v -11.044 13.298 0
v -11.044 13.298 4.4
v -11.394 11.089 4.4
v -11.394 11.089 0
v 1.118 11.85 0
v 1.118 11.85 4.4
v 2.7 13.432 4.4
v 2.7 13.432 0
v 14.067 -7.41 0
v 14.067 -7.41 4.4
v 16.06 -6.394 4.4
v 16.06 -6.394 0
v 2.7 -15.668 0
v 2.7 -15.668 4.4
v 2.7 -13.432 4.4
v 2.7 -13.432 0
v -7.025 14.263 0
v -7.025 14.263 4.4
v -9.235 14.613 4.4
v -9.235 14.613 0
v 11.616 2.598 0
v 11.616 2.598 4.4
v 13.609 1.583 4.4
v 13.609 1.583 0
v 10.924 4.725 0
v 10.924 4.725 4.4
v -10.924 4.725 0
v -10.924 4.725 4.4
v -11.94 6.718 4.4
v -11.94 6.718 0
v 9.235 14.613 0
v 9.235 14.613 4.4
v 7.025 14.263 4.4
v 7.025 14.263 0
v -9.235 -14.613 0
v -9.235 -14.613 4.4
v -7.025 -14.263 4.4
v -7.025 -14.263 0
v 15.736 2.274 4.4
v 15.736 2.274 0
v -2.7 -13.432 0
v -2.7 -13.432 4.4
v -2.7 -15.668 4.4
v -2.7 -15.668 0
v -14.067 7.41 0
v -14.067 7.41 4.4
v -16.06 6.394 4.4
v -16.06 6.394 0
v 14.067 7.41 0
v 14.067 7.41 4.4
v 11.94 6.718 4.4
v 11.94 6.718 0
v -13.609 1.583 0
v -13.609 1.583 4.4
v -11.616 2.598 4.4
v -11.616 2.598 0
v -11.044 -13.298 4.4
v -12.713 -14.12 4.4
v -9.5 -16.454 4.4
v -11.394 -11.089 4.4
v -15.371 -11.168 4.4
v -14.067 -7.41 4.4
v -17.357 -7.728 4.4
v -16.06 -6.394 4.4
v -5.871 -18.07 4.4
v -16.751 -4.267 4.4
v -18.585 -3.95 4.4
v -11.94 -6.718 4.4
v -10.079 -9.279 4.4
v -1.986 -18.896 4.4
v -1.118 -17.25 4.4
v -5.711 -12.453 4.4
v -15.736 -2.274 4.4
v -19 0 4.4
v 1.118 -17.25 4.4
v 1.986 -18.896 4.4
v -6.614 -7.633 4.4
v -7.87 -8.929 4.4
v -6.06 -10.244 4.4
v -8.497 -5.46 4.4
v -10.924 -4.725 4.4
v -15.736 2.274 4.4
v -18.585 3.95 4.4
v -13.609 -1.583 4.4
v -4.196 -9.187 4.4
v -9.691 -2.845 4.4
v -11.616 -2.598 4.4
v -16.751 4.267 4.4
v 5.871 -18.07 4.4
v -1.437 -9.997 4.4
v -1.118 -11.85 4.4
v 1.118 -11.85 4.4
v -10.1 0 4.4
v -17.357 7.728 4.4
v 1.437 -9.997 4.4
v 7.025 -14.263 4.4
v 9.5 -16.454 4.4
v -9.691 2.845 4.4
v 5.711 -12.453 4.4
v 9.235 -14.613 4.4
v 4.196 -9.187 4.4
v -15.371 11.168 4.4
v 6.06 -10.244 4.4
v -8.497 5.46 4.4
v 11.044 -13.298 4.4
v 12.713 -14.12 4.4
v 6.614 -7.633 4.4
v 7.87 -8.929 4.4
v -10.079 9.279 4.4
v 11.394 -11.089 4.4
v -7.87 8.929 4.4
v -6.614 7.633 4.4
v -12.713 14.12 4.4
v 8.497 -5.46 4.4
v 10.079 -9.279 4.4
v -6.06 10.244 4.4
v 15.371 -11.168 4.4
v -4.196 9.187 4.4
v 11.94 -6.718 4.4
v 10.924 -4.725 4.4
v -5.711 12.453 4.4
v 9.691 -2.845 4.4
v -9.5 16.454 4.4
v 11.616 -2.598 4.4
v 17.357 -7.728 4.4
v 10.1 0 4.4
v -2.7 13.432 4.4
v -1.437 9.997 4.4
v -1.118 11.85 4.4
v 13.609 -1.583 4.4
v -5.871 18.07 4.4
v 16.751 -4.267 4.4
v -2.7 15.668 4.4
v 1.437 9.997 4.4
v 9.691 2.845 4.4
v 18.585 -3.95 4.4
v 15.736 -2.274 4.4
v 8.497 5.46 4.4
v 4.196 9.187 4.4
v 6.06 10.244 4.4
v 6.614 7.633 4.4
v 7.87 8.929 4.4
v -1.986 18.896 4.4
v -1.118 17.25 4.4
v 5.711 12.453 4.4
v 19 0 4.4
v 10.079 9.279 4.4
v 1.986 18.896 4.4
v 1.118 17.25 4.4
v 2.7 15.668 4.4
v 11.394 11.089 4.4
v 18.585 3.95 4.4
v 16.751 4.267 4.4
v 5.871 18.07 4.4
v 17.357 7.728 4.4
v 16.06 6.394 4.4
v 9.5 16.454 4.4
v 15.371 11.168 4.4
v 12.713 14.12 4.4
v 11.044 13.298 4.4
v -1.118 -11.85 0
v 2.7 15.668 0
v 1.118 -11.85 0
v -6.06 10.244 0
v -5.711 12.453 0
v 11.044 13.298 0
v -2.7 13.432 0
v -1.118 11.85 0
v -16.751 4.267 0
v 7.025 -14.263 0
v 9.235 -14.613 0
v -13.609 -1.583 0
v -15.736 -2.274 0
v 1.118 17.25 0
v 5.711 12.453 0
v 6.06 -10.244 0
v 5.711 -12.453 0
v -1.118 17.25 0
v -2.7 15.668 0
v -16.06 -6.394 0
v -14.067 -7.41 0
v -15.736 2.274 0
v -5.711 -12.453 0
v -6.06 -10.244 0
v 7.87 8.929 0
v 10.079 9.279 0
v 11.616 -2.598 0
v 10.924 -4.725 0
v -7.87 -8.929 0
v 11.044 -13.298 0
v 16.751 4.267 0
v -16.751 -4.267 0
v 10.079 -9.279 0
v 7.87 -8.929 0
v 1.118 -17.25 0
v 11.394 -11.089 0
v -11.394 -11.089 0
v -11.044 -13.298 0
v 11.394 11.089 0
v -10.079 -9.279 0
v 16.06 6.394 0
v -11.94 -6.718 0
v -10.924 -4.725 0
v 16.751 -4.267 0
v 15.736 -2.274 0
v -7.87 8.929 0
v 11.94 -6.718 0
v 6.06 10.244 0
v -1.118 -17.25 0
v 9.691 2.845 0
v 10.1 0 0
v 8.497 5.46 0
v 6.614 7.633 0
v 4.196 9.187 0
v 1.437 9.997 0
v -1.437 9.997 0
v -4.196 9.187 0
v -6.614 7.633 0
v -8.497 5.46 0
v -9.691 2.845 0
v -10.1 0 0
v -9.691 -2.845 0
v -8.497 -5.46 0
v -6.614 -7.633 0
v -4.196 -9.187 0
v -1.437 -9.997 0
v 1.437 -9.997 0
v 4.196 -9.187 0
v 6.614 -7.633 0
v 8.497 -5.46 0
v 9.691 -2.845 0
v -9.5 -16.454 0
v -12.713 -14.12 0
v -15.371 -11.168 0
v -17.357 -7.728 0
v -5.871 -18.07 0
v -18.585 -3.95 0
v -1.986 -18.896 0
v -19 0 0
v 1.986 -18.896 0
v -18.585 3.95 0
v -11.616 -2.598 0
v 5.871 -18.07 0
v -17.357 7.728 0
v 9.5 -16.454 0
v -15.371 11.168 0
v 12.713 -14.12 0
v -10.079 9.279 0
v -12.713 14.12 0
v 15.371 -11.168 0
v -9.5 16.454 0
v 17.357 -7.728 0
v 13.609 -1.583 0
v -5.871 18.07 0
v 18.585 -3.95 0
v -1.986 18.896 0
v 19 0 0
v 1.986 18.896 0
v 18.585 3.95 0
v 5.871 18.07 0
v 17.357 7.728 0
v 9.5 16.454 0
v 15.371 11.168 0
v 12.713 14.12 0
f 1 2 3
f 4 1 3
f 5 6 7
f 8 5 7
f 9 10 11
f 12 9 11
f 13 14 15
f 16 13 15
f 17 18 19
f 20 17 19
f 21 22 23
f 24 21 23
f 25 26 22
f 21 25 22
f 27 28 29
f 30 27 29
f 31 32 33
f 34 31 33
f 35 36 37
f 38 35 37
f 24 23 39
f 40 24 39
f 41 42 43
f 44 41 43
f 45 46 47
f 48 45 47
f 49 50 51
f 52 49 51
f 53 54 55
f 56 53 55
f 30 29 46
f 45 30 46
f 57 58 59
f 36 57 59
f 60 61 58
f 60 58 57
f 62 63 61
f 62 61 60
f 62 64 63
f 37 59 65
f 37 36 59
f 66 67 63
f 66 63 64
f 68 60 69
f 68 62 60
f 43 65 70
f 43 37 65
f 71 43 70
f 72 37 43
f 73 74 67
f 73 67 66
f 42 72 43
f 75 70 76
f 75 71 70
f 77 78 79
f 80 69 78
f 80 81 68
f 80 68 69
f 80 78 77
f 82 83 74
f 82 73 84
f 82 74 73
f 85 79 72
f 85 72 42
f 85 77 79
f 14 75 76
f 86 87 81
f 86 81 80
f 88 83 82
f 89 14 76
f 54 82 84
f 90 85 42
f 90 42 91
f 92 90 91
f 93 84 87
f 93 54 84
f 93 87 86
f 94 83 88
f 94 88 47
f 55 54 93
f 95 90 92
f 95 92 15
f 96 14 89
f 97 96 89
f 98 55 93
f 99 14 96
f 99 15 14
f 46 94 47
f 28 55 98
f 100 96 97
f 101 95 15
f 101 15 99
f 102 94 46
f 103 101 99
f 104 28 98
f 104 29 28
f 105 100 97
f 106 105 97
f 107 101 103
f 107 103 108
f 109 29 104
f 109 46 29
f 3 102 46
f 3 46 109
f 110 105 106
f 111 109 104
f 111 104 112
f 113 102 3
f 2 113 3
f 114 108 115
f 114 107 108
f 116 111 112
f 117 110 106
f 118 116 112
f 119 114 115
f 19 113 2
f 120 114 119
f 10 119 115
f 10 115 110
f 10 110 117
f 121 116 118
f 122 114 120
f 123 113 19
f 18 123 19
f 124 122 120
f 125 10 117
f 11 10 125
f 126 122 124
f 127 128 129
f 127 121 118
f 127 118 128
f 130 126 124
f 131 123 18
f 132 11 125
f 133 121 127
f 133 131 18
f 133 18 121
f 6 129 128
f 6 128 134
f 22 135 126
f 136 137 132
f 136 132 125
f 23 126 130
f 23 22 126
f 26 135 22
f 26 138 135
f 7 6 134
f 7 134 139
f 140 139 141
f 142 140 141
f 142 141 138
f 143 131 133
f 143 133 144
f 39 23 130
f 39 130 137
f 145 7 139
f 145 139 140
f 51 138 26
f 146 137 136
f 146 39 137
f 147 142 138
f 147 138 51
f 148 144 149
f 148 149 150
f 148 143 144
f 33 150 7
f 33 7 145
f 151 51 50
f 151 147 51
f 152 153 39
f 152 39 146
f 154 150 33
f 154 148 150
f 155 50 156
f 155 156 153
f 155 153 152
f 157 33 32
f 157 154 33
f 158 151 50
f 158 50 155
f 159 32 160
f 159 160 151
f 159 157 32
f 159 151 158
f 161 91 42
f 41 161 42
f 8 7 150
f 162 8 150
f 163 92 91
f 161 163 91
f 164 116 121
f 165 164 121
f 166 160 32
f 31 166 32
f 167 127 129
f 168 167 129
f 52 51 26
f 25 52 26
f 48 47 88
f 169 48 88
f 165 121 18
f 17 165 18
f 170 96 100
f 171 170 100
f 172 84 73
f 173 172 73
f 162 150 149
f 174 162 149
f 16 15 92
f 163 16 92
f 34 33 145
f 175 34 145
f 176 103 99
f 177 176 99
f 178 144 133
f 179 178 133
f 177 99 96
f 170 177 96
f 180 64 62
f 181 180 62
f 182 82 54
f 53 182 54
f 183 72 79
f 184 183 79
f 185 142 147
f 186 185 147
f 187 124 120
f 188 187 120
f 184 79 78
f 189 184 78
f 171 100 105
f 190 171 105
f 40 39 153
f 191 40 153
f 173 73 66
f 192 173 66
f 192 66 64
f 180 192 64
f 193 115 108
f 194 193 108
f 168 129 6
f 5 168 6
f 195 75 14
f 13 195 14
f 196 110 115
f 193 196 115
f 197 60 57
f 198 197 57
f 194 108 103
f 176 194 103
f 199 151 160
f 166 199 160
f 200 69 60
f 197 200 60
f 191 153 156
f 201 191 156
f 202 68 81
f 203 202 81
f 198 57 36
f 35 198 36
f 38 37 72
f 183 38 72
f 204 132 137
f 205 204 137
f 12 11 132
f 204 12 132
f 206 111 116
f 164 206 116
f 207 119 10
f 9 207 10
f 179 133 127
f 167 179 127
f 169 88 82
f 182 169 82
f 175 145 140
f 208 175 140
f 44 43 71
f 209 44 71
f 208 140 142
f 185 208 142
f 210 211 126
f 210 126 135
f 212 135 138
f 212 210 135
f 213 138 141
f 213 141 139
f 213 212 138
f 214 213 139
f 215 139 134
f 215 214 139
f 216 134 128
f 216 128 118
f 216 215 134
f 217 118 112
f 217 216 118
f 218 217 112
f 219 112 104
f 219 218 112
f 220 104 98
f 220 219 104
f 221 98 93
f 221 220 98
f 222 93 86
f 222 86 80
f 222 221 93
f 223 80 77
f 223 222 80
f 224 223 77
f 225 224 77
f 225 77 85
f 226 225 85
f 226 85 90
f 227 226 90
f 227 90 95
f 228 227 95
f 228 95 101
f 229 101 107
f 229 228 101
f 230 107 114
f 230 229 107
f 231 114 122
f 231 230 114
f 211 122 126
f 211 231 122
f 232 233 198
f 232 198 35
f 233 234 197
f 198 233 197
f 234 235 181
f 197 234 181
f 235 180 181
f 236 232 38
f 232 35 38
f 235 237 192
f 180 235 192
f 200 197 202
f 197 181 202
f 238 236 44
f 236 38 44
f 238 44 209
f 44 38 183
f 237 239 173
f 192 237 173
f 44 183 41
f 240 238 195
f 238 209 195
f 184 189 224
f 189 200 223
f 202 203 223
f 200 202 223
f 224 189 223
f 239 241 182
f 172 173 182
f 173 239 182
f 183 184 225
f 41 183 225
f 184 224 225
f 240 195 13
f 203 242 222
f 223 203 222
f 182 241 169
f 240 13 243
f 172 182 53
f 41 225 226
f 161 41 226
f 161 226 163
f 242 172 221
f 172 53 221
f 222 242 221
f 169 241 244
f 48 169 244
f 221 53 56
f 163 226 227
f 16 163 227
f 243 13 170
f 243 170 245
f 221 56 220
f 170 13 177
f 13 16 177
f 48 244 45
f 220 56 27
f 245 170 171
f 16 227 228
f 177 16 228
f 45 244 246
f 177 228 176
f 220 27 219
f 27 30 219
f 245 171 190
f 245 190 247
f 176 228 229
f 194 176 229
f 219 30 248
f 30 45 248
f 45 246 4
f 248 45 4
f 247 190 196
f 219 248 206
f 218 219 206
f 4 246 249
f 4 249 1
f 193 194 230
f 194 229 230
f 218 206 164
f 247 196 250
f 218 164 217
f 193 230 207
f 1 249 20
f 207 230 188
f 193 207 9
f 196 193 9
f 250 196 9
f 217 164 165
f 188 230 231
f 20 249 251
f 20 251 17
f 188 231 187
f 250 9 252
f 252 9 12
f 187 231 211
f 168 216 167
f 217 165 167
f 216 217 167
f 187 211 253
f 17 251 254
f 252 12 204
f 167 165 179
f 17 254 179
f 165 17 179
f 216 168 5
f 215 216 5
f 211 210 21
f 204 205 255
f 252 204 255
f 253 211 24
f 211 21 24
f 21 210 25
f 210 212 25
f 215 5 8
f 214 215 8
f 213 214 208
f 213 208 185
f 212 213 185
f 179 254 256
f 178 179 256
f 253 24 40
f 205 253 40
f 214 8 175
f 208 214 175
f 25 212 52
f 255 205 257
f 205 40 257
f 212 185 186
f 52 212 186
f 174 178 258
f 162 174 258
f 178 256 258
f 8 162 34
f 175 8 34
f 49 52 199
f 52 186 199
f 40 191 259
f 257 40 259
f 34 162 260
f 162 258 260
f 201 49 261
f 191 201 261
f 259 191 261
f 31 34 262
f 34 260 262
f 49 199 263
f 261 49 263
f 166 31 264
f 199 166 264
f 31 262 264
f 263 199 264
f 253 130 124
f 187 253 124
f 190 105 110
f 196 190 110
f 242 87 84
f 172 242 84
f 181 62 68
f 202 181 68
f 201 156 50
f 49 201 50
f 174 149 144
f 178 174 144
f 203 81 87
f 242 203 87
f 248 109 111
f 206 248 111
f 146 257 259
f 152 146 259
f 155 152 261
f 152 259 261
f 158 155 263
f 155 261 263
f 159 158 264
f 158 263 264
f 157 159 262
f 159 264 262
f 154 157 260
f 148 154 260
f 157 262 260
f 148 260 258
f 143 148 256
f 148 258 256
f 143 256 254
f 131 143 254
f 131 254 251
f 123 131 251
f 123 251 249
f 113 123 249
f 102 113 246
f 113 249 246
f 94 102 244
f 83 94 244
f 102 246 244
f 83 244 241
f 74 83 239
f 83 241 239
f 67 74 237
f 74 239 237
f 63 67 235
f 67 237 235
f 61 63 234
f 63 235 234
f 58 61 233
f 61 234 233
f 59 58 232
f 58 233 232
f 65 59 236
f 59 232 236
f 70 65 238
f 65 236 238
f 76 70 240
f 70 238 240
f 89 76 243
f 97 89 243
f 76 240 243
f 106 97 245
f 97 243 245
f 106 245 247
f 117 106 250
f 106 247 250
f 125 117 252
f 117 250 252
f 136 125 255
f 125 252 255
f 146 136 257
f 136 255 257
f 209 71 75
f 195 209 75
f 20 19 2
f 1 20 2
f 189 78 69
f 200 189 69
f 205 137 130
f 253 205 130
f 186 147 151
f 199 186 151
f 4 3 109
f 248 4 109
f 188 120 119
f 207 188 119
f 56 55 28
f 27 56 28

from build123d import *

# Parameters (mm, degrees)
CROQUIS1_R              = 19
CROQUIS1_R_2            = 10.1
SALIENTE_EXTRUIR1_DEPTH = 4.4
CORTAR_EXTRUIR1_DEPTH   = 4.4
MATRIZC1_COUNT          = 10


with BuildPart() as part:
    # Croquis1 → Saliente-Extruir1 (new body)
    with BuildSketch(Plane(origin=(0, 0, 0), x_dir=(0, 1, 0), z_dir=(0, 0, 1))):
        with Locations(Location((0, 0, 0), (0, 0, 270))):
            Circle(CROQUIS1_R)
        with Locations(Location((0, 0, 0), (0, 0, 270))):
            Circle(CROQUIS1_R_2, mode=Mode.SUBTRACT)
    extrude(amount=SALIENTE_EXTRUIR1_DEPTH)

    # Croquis2 → Cortar-Extruir1 (cut)
    with BuildSketch(Plane.XY.offset(4.4)):
        Polygon((2.7, 13.431623382), (2.7, 15.668376618), (1.118376618, 17.25), (-1.118376618, 17.25), (-2.7, 15.668376618), (-2.7, 13.431623382), (-1.118376618, 11.85), (1.118376618, 11.85), align=None)
    cortar_extruir1 = extrude(amount=-CORTAR_EXTRUIR1_DEPTH, mode=Mode.SUBTRACT)

    # MatrizC1: Cortar-Extruir1 ×10 about axis
    matrizc1_axis = Axis((0, 0, 0), (0, 0, 1))
    for i in range(1, MATRIZC1_COUNT):
        add(cortar_extruir1.rotate(matrizc1_axis, i * 360 / MATRIZC1_COUNT), mode=Mode.SUBTRACT)


solid = part.part
